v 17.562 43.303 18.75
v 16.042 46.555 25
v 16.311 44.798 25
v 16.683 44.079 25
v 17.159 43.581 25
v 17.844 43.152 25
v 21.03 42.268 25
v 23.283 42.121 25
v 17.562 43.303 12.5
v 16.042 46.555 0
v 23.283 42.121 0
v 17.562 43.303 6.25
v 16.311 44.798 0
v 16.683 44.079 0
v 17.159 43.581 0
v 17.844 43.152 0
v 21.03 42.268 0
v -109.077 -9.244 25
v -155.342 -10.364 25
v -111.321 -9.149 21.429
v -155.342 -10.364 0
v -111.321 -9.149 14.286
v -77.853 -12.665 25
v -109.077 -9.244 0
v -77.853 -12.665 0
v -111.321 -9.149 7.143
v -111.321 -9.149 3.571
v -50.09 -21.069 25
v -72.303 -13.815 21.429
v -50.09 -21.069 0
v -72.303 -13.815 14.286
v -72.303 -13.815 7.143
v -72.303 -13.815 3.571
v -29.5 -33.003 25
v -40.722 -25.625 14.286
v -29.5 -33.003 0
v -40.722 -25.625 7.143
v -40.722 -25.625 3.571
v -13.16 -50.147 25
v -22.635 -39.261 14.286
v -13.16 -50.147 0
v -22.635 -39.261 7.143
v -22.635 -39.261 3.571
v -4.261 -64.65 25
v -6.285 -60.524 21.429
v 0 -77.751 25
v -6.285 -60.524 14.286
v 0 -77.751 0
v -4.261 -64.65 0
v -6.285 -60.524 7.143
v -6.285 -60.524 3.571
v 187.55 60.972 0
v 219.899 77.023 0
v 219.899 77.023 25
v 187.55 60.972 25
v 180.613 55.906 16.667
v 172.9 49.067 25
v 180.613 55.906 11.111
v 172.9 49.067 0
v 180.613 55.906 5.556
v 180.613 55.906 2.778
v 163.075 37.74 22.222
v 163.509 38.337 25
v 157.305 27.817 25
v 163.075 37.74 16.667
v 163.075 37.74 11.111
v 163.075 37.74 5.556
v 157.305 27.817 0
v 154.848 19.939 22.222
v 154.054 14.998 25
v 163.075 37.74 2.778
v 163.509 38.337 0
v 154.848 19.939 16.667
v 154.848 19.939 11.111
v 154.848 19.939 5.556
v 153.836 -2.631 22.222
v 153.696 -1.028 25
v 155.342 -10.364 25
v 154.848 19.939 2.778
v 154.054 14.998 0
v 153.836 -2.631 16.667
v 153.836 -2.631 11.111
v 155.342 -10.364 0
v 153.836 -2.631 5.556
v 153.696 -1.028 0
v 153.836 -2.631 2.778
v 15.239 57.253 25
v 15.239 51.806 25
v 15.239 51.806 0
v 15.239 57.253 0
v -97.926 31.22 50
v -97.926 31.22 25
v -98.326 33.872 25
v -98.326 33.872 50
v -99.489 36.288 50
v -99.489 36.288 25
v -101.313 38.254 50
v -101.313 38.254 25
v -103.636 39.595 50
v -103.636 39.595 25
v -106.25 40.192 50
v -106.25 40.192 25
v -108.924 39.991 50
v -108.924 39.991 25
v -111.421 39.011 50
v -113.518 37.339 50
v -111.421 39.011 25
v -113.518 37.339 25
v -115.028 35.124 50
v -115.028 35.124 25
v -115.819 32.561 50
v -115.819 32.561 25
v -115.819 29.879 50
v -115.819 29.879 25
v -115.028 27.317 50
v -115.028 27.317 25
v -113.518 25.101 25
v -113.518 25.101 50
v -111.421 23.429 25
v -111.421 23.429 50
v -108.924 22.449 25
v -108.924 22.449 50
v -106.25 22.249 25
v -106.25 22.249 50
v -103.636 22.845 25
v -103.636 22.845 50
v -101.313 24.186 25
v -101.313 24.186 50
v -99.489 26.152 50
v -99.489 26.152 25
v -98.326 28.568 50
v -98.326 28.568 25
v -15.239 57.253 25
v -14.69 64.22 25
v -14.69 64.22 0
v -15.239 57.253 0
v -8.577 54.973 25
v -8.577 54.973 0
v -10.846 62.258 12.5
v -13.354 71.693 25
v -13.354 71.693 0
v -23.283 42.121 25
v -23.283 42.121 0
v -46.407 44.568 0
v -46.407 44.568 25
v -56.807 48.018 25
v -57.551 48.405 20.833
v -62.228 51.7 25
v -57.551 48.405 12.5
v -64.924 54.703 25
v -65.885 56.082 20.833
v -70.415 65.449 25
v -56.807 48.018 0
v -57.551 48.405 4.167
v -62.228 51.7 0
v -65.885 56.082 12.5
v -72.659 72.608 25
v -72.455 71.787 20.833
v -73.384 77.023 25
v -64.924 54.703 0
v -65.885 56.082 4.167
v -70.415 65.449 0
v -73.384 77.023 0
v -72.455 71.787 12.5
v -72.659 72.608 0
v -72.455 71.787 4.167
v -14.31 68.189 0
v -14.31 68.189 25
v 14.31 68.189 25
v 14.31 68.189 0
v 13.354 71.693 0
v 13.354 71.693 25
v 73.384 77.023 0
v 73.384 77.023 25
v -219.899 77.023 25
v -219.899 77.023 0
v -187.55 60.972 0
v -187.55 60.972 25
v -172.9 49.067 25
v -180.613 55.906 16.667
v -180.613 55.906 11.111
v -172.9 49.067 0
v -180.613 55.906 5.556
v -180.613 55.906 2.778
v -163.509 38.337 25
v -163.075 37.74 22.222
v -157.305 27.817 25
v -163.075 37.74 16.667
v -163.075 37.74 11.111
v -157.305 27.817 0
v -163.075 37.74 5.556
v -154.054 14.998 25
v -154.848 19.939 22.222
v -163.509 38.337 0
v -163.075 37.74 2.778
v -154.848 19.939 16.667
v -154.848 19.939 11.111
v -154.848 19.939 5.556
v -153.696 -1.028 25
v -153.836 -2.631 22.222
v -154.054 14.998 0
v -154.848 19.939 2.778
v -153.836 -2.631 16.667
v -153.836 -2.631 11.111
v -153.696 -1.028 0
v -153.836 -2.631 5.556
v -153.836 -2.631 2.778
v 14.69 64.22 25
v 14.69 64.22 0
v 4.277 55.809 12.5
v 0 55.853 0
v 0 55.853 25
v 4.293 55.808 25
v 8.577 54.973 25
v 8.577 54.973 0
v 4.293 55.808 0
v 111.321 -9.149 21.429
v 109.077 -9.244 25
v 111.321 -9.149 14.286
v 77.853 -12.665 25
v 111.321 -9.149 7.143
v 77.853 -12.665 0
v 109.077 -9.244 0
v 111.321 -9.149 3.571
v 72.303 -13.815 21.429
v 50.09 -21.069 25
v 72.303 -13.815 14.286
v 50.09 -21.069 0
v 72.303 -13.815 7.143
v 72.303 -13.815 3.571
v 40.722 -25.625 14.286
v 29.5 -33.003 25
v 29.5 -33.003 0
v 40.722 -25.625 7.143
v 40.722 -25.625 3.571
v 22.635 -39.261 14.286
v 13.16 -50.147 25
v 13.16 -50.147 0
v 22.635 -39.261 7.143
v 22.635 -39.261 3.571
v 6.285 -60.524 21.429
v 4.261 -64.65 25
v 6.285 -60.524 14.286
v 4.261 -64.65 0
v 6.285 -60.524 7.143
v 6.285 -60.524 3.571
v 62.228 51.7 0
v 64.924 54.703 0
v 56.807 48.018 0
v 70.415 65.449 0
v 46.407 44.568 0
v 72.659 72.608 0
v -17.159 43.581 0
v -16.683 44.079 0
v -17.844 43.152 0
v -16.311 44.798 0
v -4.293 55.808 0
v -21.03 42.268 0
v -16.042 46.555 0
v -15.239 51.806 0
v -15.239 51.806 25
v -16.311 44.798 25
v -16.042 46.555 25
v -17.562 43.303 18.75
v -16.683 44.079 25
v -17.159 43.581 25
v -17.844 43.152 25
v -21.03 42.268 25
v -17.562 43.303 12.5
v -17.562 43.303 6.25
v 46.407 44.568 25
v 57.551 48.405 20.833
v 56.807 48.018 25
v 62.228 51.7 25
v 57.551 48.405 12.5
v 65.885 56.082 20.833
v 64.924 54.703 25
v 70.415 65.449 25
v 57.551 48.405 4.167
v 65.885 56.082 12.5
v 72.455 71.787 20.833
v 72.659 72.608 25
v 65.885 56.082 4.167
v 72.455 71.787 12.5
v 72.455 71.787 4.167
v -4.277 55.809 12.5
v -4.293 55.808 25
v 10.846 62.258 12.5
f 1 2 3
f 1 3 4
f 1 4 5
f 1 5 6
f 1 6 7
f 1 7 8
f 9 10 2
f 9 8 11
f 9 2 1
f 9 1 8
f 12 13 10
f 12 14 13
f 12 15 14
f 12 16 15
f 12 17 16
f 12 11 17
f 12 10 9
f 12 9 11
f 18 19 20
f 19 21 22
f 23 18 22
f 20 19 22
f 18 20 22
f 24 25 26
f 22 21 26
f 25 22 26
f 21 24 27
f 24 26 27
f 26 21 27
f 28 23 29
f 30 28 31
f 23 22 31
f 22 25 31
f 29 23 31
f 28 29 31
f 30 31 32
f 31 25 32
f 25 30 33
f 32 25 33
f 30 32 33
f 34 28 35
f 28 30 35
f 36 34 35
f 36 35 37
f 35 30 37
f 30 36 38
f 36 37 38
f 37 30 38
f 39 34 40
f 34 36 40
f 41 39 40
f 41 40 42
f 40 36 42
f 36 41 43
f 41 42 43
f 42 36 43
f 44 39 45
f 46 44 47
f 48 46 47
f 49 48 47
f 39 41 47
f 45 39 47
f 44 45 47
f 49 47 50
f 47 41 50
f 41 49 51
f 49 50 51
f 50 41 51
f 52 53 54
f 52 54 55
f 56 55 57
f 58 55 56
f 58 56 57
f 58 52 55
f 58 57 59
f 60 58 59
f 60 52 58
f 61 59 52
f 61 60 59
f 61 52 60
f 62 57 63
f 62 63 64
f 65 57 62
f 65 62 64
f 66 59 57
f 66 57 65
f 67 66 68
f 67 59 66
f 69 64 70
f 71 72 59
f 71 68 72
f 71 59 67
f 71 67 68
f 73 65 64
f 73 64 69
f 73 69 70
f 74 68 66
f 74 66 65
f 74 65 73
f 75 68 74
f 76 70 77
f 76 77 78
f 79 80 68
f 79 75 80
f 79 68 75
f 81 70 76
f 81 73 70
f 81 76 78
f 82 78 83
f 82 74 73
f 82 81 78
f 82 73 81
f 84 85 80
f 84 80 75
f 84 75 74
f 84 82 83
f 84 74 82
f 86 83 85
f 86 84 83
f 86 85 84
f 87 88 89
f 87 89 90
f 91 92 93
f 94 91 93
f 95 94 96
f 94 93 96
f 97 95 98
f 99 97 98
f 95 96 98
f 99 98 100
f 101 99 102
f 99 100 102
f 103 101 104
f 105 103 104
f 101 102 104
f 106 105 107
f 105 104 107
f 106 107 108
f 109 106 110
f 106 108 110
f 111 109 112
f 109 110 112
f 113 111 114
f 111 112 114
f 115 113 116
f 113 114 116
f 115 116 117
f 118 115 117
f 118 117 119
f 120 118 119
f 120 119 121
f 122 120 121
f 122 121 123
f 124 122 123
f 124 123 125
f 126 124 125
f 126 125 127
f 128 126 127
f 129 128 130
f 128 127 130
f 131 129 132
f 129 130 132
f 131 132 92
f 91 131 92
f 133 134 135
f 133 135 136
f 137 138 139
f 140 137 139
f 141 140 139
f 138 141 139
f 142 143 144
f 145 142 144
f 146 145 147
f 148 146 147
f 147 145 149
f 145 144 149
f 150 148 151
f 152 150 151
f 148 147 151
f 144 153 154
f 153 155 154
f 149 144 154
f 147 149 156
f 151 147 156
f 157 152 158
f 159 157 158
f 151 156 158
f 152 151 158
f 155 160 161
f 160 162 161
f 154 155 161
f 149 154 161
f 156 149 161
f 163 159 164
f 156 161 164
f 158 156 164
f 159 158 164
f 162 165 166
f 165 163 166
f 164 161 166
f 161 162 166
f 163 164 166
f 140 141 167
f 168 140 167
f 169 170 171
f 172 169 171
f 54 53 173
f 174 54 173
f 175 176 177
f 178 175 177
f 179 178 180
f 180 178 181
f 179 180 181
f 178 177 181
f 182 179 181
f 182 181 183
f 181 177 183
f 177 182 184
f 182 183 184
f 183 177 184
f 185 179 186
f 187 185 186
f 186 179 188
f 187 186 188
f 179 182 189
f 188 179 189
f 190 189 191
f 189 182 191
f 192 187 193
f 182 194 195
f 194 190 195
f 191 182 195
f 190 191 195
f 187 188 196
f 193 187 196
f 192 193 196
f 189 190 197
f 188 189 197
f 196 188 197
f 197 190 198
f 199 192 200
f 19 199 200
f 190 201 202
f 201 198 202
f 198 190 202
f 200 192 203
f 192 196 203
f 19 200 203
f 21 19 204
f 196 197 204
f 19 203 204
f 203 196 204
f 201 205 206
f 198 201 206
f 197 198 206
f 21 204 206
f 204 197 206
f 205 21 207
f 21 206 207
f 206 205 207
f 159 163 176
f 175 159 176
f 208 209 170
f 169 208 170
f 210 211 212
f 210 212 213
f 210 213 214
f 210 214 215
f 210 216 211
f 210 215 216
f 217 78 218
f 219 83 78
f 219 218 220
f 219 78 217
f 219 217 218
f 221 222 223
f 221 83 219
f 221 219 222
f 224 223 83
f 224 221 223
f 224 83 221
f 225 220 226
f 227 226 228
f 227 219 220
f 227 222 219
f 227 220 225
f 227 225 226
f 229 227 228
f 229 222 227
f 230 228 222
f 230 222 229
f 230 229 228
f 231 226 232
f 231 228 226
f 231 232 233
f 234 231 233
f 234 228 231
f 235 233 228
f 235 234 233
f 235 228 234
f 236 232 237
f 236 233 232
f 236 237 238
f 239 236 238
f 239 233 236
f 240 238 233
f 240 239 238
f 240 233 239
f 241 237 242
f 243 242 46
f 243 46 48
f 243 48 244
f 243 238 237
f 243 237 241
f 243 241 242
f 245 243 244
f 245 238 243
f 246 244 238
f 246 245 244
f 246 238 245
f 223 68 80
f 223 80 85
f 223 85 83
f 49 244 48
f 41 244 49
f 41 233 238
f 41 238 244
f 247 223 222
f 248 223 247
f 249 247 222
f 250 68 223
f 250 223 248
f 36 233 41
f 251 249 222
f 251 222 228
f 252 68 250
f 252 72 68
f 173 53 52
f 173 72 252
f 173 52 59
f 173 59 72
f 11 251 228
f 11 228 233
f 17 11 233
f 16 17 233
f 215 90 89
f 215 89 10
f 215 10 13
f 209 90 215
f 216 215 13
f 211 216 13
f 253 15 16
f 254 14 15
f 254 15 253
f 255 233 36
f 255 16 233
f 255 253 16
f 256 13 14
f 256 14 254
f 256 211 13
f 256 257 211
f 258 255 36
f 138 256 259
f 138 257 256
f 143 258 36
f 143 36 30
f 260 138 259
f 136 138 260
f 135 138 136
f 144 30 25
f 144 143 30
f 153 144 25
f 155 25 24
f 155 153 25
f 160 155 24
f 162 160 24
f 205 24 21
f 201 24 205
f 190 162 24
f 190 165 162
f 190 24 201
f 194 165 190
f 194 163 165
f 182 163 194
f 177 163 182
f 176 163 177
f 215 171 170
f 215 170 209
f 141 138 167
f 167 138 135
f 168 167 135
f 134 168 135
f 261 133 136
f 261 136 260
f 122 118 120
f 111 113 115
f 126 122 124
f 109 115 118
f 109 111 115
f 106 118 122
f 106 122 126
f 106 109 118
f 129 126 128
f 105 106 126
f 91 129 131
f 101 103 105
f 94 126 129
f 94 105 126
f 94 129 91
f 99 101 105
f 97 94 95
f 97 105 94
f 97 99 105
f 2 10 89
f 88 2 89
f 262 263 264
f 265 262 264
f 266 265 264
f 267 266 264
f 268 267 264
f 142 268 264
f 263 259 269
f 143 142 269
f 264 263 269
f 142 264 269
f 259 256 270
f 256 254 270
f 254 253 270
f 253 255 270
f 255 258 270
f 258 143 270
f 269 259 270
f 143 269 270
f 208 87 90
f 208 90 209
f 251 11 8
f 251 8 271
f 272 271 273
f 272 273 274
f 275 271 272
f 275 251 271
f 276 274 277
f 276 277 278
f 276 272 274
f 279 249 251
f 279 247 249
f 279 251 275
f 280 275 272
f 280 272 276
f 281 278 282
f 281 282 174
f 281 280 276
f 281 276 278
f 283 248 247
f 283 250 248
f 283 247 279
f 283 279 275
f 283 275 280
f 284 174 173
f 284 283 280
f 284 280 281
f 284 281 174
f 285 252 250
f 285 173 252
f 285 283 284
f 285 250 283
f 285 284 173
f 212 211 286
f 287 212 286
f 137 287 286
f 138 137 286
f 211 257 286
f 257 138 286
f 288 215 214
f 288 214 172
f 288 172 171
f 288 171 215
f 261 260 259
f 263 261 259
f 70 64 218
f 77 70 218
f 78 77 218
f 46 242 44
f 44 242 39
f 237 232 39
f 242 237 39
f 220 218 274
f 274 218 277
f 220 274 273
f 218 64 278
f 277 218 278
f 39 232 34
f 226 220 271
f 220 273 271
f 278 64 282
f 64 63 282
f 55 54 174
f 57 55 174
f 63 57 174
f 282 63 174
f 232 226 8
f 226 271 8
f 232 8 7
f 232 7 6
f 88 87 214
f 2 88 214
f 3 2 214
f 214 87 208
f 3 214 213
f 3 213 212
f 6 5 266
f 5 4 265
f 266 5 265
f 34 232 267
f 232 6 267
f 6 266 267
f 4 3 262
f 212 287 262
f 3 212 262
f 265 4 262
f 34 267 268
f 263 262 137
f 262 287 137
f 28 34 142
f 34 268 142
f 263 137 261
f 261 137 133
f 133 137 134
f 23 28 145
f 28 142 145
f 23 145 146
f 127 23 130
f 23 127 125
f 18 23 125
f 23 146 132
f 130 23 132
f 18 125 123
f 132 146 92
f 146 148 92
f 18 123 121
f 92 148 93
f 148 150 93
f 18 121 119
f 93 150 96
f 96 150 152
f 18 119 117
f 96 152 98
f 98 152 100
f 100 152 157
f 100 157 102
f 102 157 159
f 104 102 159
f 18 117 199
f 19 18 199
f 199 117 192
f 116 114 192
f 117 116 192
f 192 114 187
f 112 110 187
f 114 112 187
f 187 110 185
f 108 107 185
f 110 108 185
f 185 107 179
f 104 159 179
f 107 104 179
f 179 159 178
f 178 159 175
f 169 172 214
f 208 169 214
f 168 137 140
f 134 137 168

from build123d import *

# Parameters (mm, degrees)
F1_DEPTH = 25
F2_R     = 8.9966602053
F3_DEPTH = 25


with BuildPart() as f1:
    # F0 (on Top) → F1 (new body)
    with BuildSketch(Plane.XY):
        with BuildLine():
            add(Edge.make_bspline(
                [(0, 55.8526235752), (1.4280795362, 55.9029637891), (4.3012554156, 56.0042440643), (7.1458772439, 55.3181953486), (8.5766120037, 54.9731393785)],
                knots=[0, 0, 0, 0, 0.4970386764, 1, 1, 1, 1], degree=3))
            add(Edge.make_bspline(
                [(0, 55.8526235752), (-1.4280795362, 55.9029637891), (-4.3012554156, 56.0042440643), (-7.1458772439, 55.3181953486), (-8.5766120037, 54.9731393785)],
                knots=[0, 0, 0, 0, 0.4970386764, 1, 1, 1, 1], degree=3))
            add(Edge.make_bspline(
                [(-8.5766120037, 54.9731393785), (-9.6514692623, 57.7199939494), (-10.7798098483, 62.0912705565), (-12.5229449449, 68.4425182702), (-13.3537546584, 71.6931354436)],
                knots=[0, 0, 0, 0, 0.4692370062, 1, 1, 1, 1], degree=3))
            Line((-13.3537546584, 71.6931354436), (-14.3104480225, 68.1894228319))
            Line((-14.3104480225, 68.1894228319), (-14.6904686593, 64.2203330608))
            Line((-14.6904686593, 64.2203330608), (-15.2393841705, 57.2533148191))
            Line((-15.2393841705, 57.2533148191), (-15.2393841705, 51.8063676534))
            Line((-15.2393841705, 51.8063676534), (-16.0416477287, 46.5545669952))
            add(Edge.make_bspline(
                [(-16.0416477287, 46.5545669952), (-16.0782398272, 45.9712438272), (-16.1541405962, 44.7612919849), (-17.36128719, 42.9541275979), (-21.487150658, 42.106860984), (-22.7709461909, 42.1169743448), (-23.2831265938, 42.1210091502)],
                knots=[0, 0, 0, 0, 0.2160094844, 0.4480553625, 0.7797973123, 1, 1, 1, 1], degree=3))
            add(Edge.make_bspline(
                [(-23.2831265938, 42.1210091502), (-27.2965375372, 42.3088440811), (-35.3259108761, 42.6846333556), (-47.3113383189, 44.4505093957), (-57.81741508, 47.8092168889), (-66.8624396005, 55.0249311035), (-72.763514145, 71.5001102031), (-73.2202899067, 75.5655462835), (-73.3840514825, 77.0230715613)],
                knots=[0, 0, 0, 0, 0.1734744818, 0.3470592468, 0.5097817941, 0.6791962113, 0.8849865987, 1, 1, 1, 1], degree=3))
            Line((-73.3840514825, 77.0230715613), (-219.8993484104, 77.0230715613))
            add(Edge.make_bspline(
                [(-219.8993484104, 77.0230715613), (-216.7514866718, 75.7734251957), (-210.364333067, 73.237836294), (-200.8266893884, 68.423468755), (-189.669984007, 62.6285144966), (-180.5212779679, 56.1377515198), (-170.6837735136, 47.2457974455), (-162.5934600363, 37.6993260588), (-153.3213038909, 22.5624126907), (-153.1788353257, -2.3664218304), (-154.7666973105, -8.2358443771), (-155.342458745, -10.3641068946)],
                knots=[0, 0, 0, 0, 0.0982467279, 0.1993470471, 0.3080851749, 0.4119626995, 0.5229658015, 0.6311769641, 0.7614646207, 0.913506669, 1, 1, 1, 1], degree=3))
            add(Edge.make_bspline(
                [(-155.342458745, -10.3641068946), (-151.1078703147, -10.017185236), (-140.6470011893, -9.1601711182), (-110.3631366823, -8.3829172418), (-69.6209011536, -12.5152355728), (-40.4084978403, -24.8146934434), (-23.8256078227, -36.5719180218), (-4.7595753666, -59.7522314236), (-1.4611931069, -72.2254798237), (0, -77.7511657961)],
                knots=[0, 0, 0, 0, 0.1052665669, 0.2600441101, 0.443479225, 0.5997543907, 0.7273978551, 0.8792364427, 1, 1, 1, 1], degree=3))
            add(Edge.make_bspline(
                [(155.342458745, -10.3641068946), (151.1078703147, -10.017185236), (140.6470011893, -9.1601711182), (110.3631366823, -8.3829172418), (69.6209011536, -12.5152355728), (40.4084978403, -24.8146934434), (23.8256078227, -36.5719180218), (4.7595753666, -59.7522314236), (1.4611931069, -72.2254798237), (0, -77.7511657961)],
                knots=[0, 0, 0, 0, 0.1052665669, 0.2600441101, 0.443479225, 0.5997543907, 0.7273978551, 0.8792364427, 1, 1, 1, 1], degree=3))
            add(Edge.make_bspline(
                [(219.8993484104, 77.0230715613), (216.7514866718, 75.7734251957), (210.364333067, 73.237836294), (200.8266893884, 68.423468755), (189.669984007, 62.6285144966), (180.5212779679, 56.1377515198), (170.6837735136, 47.2457974455), (162.5934600363, 37.6993260588), (153.3213038909, 22.5624126907), (153.1788353257, -2.3664218304), (154.7666973105, -8.2358443771), (155.342458745, -10.3641068946)],
                knots=[0, 0, 0, 0, 0.0982467279, 0.1993470471, 0.3080851749, 0.4119626995, 0.5229658015, 0.6311769641, 0.7614646207, 0.913506669, 1, 1, 1, 1], degree=3))
            Line((219.8993484104, 77.0230715613), (73.3840514825, 77.0230715613))
            add(Edge.make_bspline(
                [(23.2831265938, 42.1210091502), (27.2965375372, 42.3088440811), (35.3259108761, 42.6846333556), (47.3113383189, 44.4505093957), (57.81741508, 47.8092168889), (66.8624396005, 55.0249311035), (72.763514145, 71.5001102031), (73.2202899067, 75.5655462835), (73.3840514825, 77.0230715613)],
                knots=[0, 0, 0, 0, 0.1734744818, 0.3470592468, 0.5097817941, 0.6791962113, 0.8849865987, 1, 1, 1, 1], degree=3))
            add(Edge.make_bspline(
                [(16.0416477287, 46.5545669952), (16.0782398272, 45.9712438272), (16.1541405962, 44.7612919849), (17.36128719, 42.9541275979), (21.487150658, 42.106860984), (22.7709461909, 42.1169743448), (23.2831265938, 42.1210091502)],
                knots=[0, 0, 0, 0, 0.2160094844, 0.4480553625, 0.7797973123, 1, 1, 1, 1], degree=3))
            Line((16.0416477287, 46.5545669952), (15.2393841705, 51.8063676534))
            Line((15.2393841705, 51.8063676534), (15.2393841705, 57.2533148191))
            Line((15.2393841705, 57.2533148191), (14.6904686593, 64.2203330608))
            Line((14.6904686593, 64.2203330608), (14.3104480225, 68.1894228319))
            Line((14.3104480225, 68.1894228319), (13.3537546584, 71.6931354436))
            add(Edge.make_bspline(
                [(8.5766120037, 54.9731393785), (9.6514692623, 57.7199939494), (10.7798098483, 62.0912705565), (12.5229449449, 68.4425182702), (13.3537546584, 71.6931354436)],
                knots=[0, 0, 0, 0, 0.4692370062, 1, 1, 1, 1], degree=3))
        make_face()
    extrude(amount=F1_DEPTH)

    # F2 (on face) → F3 (join)
    with BuildSketch(Plane.XY.offset(25)):
        with Locations((-106.9225072861, 31.2201026827)):
            Circle(F2_R)
    extrude(amount=F3_DEPTH)


solid = f1.part
